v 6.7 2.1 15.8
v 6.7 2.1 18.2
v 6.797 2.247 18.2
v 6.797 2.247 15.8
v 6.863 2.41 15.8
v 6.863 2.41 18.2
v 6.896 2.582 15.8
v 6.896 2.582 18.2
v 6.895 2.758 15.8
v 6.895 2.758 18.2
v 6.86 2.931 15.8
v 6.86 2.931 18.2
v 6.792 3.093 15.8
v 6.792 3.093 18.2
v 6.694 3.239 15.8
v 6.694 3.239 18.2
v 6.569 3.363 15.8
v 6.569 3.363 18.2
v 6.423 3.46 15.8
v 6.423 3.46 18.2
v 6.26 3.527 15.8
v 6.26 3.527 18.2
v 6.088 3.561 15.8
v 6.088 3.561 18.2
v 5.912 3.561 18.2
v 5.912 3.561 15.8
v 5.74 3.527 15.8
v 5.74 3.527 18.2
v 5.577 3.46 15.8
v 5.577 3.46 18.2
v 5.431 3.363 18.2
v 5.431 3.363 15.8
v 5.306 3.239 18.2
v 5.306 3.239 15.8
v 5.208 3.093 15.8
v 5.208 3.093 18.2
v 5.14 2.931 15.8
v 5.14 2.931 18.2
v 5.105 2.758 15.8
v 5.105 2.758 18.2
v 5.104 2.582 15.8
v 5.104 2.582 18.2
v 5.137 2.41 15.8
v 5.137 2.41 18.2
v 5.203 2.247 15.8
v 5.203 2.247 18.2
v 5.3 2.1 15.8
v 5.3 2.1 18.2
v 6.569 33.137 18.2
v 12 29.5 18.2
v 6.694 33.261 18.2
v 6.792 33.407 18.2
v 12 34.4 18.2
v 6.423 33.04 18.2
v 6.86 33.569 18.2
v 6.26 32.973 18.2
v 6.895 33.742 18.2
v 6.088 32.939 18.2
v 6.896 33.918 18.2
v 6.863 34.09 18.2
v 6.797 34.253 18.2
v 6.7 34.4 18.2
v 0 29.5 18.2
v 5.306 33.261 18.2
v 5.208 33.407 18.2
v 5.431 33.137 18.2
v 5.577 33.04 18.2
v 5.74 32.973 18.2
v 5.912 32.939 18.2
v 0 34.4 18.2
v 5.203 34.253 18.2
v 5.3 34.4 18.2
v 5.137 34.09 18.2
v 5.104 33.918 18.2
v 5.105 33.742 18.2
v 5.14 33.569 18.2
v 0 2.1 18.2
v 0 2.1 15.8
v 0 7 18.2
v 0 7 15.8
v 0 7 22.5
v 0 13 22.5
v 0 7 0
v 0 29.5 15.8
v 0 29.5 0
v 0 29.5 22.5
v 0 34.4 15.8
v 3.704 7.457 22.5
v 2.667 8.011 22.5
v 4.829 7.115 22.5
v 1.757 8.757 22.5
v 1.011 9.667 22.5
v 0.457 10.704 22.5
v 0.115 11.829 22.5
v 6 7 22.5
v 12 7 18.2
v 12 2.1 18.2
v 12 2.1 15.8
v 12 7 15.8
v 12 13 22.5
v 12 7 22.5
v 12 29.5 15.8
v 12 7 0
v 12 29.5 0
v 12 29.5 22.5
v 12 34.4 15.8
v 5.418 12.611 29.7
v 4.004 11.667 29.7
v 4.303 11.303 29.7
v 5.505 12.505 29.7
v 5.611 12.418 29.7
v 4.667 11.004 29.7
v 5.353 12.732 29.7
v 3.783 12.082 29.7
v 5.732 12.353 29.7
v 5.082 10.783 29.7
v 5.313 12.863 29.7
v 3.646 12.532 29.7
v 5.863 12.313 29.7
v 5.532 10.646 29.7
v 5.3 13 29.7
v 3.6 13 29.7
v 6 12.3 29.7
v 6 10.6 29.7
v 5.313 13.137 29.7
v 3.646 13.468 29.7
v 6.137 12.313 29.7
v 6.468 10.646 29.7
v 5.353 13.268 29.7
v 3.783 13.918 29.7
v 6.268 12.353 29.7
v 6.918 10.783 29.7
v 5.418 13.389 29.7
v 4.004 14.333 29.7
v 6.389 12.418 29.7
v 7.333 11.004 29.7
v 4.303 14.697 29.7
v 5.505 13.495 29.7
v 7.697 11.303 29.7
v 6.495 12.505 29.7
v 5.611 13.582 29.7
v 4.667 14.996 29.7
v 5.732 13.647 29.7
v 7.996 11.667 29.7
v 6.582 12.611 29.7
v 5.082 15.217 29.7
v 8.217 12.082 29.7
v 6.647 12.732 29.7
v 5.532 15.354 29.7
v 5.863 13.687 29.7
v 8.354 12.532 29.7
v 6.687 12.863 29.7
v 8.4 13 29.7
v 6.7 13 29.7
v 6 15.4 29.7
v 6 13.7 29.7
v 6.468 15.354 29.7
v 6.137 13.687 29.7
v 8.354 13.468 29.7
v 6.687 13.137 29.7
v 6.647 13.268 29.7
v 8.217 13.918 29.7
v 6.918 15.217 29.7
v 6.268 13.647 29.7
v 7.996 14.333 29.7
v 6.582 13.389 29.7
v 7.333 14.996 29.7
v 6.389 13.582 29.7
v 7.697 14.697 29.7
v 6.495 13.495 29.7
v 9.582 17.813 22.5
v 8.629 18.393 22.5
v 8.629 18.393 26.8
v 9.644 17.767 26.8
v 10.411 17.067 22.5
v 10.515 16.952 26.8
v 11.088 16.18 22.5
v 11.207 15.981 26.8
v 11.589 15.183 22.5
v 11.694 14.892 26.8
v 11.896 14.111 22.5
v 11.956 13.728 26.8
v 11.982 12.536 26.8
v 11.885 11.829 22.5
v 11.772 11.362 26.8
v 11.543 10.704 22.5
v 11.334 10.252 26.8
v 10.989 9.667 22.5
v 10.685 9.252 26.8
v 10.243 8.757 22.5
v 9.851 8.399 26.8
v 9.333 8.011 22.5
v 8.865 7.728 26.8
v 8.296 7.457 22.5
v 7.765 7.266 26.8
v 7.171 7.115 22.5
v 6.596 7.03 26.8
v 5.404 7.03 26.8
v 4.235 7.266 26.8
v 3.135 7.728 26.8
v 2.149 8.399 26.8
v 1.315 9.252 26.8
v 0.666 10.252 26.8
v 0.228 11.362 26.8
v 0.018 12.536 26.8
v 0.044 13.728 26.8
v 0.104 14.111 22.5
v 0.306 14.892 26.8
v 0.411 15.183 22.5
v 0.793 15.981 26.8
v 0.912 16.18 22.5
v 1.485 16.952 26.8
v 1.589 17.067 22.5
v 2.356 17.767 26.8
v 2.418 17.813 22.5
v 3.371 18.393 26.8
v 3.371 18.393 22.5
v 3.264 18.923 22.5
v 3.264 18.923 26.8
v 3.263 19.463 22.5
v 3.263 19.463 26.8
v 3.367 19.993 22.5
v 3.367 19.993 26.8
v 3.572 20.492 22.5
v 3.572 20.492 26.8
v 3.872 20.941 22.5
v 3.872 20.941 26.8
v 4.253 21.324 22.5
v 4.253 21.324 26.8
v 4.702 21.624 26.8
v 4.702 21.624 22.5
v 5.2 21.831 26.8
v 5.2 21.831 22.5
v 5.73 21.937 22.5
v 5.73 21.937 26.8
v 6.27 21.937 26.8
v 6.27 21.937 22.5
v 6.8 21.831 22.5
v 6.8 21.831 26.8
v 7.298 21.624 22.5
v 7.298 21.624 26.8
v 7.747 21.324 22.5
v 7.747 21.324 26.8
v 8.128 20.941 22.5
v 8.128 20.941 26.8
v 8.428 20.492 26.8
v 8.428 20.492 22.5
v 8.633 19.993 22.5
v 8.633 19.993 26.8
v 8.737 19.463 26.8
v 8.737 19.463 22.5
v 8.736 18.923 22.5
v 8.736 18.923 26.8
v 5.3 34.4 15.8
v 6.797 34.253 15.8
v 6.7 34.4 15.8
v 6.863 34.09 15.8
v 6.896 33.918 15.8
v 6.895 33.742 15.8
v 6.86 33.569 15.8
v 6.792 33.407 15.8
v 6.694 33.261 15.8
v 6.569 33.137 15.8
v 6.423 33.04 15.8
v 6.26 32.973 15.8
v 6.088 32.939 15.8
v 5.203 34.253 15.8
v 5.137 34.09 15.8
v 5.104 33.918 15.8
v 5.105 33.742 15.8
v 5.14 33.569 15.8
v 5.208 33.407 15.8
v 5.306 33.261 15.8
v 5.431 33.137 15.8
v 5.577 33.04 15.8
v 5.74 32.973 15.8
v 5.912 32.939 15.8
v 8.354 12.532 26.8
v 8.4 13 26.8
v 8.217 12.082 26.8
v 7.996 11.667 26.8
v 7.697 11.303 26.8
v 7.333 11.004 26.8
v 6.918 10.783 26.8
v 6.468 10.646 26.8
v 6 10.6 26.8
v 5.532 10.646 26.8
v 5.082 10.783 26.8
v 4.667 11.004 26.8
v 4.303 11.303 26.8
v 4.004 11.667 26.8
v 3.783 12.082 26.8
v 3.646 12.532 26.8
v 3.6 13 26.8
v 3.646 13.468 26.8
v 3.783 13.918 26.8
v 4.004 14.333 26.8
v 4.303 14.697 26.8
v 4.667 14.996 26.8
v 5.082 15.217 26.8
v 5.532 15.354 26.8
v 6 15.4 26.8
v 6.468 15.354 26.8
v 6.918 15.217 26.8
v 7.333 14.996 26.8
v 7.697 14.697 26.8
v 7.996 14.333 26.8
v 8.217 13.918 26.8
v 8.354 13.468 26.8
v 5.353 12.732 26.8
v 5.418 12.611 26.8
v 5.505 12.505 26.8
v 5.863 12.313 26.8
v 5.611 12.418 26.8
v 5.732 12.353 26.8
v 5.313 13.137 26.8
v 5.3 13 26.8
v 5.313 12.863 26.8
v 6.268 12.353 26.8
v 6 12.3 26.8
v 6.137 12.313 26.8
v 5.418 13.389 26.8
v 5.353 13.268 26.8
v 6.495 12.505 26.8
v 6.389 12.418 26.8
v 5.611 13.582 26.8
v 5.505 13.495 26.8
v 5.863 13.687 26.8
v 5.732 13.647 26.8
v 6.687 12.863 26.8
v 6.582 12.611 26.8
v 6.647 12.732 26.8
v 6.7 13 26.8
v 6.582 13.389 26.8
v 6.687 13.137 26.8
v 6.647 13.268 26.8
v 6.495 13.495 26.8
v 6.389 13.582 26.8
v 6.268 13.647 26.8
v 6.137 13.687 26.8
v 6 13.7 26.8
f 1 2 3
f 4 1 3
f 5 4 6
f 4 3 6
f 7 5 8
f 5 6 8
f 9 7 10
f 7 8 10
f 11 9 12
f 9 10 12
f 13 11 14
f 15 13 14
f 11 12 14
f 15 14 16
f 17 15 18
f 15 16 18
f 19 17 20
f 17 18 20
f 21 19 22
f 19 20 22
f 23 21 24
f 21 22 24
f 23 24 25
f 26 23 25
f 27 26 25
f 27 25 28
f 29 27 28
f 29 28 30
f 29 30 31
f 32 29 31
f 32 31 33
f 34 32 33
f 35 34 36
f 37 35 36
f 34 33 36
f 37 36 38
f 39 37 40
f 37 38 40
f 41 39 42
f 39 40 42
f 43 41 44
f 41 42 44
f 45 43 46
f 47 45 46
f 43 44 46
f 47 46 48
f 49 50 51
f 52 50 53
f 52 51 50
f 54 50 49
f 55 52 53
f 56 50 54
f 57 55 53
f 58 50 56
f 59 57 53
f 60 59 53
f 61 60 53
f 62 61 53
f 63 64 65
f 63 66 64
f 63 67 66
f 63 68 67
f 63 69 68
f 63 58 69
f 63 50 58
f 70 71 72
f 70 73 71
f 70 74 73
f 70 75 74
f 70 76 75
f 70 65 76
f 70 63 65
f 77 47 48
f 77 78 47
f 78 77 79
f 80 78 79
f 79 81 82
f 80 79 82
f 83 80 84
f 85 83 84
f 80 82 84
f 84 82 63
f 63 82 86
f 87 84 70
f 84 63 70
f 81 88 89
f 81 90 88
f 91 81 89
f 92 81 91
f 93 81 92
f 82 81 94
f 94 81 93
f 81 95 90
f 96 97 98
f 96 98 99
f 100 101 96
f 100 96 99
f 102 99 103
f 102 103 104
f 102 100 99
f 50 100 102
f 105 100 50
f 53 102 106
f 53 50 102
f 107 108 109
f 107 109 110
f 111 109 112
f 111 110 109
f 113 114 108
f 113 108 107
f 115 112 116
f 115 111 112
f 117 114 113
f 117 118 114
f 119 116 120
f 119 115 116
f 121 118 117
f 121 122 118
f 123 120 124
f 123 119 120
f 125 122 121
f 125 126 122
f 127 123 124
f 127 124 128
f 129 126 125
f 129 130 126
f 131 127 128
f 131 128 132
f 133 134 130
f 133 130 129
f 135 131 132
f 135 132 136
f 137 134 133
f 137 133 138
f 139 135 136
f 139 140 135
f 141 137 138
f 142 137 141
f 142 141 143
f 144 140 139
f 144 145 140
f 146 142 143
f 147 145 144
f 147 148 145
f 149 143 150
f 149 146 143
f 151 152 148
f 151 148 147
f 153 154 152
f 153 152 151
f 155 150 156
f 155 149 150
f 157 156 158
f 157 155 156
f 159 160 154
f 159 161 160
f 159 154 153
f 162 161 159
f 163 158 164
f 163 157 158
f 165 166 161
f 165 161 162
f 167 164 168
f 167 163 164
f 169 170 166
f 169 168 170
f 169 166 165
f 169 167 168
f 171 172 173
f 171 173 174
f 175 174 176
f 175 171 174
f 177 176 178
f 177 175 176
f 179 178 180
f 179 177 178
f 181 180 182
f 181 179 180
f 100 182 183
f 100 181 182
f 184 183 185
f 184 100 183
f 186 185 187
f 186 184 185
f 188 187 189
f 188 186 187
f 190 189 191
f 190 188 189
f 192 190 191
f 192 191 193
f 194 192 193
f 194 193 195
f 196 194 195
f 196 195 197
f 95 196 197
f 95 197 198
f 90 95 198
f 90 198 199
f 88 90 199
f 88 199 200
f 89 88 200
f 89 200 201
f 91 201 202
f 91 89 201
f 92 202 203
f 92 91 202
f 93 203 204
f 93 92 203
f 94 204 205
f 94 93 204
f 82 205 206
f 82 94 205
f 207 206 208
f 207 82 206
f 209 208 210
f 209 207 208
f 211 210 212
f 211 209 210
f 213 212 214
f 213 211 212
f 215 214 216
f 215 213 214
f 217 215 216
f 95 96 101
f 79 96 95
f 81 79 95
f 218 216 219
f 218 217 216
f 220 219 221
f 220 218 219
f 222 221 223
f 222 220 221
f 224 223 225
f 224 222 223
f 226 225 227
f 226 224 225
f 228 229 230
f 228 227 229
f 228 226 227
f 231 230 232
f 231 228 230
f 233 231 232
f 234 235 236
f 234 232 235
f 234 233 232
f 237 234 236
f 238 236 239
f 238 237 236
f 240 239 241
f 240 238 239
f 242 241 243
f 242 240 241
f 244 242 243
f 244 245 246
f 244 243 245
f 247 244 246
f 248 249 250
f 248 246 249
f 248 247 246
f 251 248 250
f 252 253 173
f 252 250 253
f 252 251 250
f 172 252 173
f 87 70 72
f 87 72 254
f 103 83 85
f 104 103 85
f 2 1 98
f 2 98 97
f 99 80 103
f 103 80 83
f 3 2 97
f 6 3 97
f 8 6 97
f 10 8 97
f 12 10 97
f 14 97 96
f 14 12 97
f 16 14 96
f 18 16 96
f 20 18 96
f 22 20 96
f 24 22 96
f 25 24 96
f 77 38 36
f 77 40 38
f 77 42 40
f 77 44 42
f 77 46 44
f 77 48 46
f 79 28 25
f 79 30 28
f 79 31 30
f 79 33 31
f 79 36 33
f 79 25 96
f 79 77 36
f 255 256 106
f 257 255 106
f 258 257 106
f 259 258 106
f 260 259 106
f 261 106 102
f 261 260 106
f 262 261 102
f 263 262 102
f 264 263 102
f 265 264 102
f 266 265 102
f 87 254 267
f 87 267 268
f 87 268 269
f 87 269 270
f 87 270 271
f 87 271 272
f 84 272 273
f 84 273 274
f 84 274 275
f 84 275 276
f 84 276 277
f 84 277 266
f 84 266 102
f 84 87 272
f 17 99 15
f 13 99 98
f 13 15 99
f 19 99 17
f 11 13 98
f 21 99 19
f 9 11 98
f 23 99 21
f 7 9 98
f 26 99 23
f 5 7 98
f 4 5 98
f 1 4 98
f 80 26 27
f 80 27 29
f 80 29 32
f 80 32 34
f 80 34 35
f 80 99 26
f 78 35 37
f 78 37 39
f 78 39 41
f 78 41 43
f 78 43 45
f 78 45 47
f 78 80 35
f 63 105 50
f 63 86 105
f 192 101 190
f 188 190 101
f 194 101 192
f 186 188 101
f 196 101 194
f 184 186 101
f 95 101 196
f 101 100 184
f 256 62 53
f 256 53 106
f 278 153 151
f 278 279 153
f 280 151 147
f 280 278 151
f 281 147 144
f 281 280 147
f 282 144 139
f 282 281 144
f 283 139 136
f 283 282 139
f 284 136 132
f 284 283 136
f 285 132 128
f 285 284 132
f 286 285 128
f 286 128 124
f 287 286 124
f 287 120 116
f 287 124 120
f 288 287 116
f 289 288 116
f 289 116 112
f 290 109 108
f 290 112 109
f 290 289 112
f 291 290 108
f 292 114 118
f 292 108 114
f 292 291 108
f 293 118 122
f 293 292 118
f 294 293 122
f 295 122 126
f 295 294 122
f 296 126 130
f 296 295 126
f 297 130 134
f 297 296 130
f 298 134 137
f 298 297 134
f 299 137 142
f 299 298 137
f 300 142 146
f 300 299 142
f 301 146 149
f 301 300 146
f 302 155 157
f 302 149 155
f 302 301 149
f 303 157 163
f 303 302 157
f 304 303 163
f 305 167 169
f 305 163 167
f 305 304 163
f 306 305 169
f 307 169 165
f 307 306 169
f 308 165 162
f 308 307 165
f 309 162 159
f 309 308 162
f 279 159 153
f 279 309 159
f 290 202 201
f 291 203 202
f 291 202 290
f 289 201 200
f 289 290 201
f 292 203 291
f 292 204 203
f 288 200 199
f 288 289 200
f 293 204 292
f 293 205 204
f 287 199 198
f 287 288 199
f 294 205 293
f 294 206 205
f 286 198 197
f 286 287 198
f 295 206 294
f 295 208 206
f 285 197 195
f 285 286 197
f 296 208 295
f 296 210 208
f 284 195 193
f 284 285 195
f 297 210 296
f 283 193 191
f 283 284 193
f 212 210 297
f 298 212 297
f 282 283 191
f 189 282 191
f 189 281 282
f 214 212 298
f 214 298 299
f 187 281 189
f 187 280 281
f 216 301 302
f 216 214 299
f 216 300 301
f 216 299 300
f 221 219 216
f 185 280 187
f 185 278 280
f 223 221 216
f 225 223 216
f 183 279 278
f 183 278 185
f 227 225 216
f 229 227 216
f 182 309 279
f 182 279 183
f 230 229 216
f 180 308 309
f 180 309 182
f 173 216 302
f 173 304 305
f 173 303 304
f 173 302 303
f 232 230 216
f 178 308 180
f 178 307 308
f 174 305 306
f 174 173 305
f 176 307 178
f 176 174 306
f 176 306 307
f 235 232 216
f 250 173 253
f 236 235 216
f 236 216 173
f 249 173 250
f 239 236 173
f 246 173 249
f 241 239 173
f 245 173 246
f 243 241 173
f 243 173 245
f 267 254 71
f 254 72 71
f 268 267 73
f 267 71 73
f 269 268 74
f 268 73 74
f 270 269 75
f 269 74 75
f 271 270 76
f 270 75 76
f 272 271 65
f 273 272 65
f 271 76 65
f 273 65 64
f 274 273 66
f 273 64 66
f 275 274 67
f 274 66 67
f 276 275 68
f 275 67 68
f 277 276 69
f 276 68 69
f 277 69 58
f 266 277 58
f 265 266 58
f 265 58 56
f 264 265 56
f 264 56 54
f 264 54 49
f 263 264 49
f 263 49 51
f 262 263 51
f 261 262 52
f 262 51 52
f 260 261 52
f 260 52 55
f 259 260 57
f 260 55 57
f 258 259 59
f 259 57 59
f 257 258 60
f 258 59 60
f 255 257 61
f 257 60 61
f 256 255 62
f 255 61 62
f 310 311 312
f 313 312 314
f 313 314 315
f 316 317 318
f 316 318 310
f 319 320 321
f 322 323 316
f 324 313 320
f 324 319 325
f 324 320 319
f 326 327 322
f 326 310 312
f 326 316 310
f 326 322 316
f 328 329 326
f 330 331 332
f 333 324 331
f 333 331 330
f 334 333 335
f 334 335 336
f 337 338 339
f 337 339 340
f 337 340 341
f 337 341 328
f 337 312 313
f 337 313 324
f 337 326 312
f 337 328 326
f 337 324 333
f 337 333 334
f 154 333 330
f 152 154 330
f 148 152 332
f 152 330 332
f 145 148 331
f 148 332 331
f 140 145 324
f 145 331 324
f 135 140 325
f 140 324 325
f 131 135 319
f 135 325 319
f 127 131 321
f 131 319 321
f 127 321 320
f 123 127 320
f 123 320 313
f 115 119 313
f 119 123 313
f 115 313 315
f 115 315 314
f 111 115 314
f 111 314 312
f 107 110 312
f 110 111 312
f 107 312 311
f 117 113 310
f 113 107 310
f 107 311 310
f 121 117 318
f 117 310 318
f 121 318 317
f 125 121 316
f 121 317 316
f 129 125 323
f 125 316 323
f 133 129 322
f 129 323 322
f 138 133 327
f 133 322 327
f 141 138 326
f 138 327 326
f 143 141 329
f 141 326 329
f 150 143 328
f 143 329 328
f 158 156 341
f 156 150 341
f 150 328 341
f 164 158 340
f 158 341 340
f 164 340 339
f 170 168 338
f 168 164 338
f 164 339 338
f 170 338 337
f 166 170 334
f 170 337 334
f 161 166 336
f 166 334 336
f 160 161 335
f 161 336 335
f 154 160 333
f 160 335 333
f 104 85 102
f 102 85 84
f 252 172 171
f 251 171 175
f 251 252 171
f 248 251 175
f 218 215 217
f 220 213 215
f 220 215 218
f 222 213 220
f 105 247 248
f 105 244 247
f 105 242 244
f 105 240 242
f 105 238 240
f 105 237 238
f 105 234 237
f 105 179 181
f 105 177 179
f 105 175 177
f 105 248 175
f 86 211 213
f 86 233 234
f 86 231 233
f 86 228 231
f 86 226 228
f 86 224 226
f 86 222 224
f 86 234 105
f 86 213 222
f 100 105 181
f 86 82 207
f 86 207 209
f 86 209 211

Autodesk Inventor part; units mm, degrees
ref_plane "YZ Plane" through (0, 0, 0) normal (1, 0, 0) x (0, 1, 0)
ref_plane "XZ Plane" through (0, 0, 0) normal (0, 1, 0) x (-1, 0, 0)
ref_plane "XY Plane" through (0, 0, 0) normal (0, 0, 1) x (1, 0, 0)
sketch "Sketch1" plane through (0, 0, 0) normal (1, 0, 0) x (0, 1, 0)
  line L0 (7, 0) -> (29.5, 0)
  line L1 (0, 0) -> (7, 0)
  line L2 (7, 0) -> (29.5, 0)
  line L3 (29.5, 0) -> (29.5, 15.8)
  line L4 (7, 15.8) -> (7, 0)
  line L5 (29.5, 15.8) -> (34.4, 15.8) construction
  line L6 (2.1, 15.8) -> (2.1, 18.2)
  line L7 (34.4, 18.2) -> (34.4, 15.8)
  line L8 (7, 18.2) -> (7, 22.5)
  line L9 (7, 22.5) -> (29.5, 22.5)
  line L10 (29.5, 22.5) -> (29.5, 18.2)
  line L11 (2.1, 18.2) -> (7, 18.2)
  line L12 (29.5, 18.2) -> (34.4, 18.2)
  line L13 (34.4, 15.8) -> (29.5, 15.8)
  line L14 (7, 15.8) -> (2.1, 15.8)
  dimension "d2" = 22.5
  dimension "d3" = 15.8
  dimension "d5" = 2.4
  dimension "d6" = 4.3
  dimension "d7" = 22.5
  dimension "d8" = 4.3
  dimension "d9" = 2.4
  dimension "d10" = 15.8
  dimension "d13" = 4.9
  dimension "d14" = 4.9
extrude "Extrusion1" add sketch "Sketch1" along normal blind 12
sketch "Sketch2" plane through (0, 7, 22.5) normal (0, 0, 1) x (1, 0, 0)
  line L0 (0, 22.5) -> (0, 0) projected
  line L1 (0, 0) -> (12, 0) projected
  line L2 (12, 22.5) -> (12, 0) projected
  line L3 (0, 22.5) -> (12, 22.5) projected
  line L4 (0, 0) -> (12, 0) projected
  line L5 (0, -4.9) -> (12, -4.9) projected
  circle A0 centre (6, 6) radius 0.7 construction
  circle A1 centre (6, 6) radius 2.4 construction
  line L6 (0, 0) -> (12, 0) projected
  arc A2 (3.371, 11.3933) -> (8.629, 11.3933) centre (6, 6) ccw
  line L7 (12, 0) -> (12, 22.5) projected
  arc A3 (8.629, 11.3933) -> (3.371, 11.3933) centre (6, 12.2) ccw
  point P0 (0, -7)
  dimension "d16" = 1.4
  dimension "d17" = 4.8
  dimension "d20" = 5.5
  dimension "d21" = 6
  dimension "d22" = 6.2
extrude "Extrusion2" add sketch "Sketch2" along normal blind 4.3 contours A2 A3
sketch "Sketch3" plane through (0, 7, 26.8) normal (0, 0, 1) x (1, 0, 0)
  circle A0 centre (6, 6) radius 0.7
  circle A1 centre (6, 6) radius 2.4
  dimension "d25" = 1.4
  dimension "d26" = 4.8
extrude "Extrusion3" add sketch "Sketch3" along normal blind 2.9
sketch "Sketch4" plane through (0, 29.5, 18.2) normal (0, 0, 1) x (1, 0, 0)
  line L0 (0, -22.5) -> (0, -27.4) projected
  line L1 (0, -27.4) -> (12, -27.4) projected
  line L2 (12, -22.5) -> (12, -27.4) projected
  line L3 (0, -22.5) -> (12, -22.5) projected
  line L4 (0, 4.9) -> (0, 0) projected
  line L5 (0, 0) -> (12, 0) projected
  line L6 (12, 4.9) -> (12, 0) projected
  line L7 (0, 4.9) -> (12, 4.9) projected
  line L8 (0, -16.5) -> (0, -22.5) projected
  line L9 (0, 0) -> (0, -16.5) projected
  line L10 (12, 0) -> (12, -16.5) projected
  line L11 (12, -16.5) -> (12, -22.5) projected
  line L12 (0, -22.5) -> (0, 0) projected
  line L13 (0, -11.25) -> (12, -11.25)
  arc A0 (5.3, 4.9) -> (6.7, 4.9) centre (6, 4.3343) ccw
  line L14 (5.3, 4.9) -> (6.7, 4.9)
  line L15 (0, 4.9) -> (12, 4.9) projected
  arc A1 (6.7, -27.4) -> (5.3, -27.4) centre (6, -26.8343) ccw
  line L16 (5.3, -27.4) -> (6.7, -27.4)
  point P0 (0, -29.5)
  point P1 (5.3, -27.4)
  dimension "d32" = 5.3
  dimension "d33" = 5.3
  dimension "d35" = 0.9
extrude "Extrusion4" cut sketch "Sketch4" against normal up to surface (2.4 mm away) contours A1 L1 | L7 A0
properties part number "Microservo Mg90"
